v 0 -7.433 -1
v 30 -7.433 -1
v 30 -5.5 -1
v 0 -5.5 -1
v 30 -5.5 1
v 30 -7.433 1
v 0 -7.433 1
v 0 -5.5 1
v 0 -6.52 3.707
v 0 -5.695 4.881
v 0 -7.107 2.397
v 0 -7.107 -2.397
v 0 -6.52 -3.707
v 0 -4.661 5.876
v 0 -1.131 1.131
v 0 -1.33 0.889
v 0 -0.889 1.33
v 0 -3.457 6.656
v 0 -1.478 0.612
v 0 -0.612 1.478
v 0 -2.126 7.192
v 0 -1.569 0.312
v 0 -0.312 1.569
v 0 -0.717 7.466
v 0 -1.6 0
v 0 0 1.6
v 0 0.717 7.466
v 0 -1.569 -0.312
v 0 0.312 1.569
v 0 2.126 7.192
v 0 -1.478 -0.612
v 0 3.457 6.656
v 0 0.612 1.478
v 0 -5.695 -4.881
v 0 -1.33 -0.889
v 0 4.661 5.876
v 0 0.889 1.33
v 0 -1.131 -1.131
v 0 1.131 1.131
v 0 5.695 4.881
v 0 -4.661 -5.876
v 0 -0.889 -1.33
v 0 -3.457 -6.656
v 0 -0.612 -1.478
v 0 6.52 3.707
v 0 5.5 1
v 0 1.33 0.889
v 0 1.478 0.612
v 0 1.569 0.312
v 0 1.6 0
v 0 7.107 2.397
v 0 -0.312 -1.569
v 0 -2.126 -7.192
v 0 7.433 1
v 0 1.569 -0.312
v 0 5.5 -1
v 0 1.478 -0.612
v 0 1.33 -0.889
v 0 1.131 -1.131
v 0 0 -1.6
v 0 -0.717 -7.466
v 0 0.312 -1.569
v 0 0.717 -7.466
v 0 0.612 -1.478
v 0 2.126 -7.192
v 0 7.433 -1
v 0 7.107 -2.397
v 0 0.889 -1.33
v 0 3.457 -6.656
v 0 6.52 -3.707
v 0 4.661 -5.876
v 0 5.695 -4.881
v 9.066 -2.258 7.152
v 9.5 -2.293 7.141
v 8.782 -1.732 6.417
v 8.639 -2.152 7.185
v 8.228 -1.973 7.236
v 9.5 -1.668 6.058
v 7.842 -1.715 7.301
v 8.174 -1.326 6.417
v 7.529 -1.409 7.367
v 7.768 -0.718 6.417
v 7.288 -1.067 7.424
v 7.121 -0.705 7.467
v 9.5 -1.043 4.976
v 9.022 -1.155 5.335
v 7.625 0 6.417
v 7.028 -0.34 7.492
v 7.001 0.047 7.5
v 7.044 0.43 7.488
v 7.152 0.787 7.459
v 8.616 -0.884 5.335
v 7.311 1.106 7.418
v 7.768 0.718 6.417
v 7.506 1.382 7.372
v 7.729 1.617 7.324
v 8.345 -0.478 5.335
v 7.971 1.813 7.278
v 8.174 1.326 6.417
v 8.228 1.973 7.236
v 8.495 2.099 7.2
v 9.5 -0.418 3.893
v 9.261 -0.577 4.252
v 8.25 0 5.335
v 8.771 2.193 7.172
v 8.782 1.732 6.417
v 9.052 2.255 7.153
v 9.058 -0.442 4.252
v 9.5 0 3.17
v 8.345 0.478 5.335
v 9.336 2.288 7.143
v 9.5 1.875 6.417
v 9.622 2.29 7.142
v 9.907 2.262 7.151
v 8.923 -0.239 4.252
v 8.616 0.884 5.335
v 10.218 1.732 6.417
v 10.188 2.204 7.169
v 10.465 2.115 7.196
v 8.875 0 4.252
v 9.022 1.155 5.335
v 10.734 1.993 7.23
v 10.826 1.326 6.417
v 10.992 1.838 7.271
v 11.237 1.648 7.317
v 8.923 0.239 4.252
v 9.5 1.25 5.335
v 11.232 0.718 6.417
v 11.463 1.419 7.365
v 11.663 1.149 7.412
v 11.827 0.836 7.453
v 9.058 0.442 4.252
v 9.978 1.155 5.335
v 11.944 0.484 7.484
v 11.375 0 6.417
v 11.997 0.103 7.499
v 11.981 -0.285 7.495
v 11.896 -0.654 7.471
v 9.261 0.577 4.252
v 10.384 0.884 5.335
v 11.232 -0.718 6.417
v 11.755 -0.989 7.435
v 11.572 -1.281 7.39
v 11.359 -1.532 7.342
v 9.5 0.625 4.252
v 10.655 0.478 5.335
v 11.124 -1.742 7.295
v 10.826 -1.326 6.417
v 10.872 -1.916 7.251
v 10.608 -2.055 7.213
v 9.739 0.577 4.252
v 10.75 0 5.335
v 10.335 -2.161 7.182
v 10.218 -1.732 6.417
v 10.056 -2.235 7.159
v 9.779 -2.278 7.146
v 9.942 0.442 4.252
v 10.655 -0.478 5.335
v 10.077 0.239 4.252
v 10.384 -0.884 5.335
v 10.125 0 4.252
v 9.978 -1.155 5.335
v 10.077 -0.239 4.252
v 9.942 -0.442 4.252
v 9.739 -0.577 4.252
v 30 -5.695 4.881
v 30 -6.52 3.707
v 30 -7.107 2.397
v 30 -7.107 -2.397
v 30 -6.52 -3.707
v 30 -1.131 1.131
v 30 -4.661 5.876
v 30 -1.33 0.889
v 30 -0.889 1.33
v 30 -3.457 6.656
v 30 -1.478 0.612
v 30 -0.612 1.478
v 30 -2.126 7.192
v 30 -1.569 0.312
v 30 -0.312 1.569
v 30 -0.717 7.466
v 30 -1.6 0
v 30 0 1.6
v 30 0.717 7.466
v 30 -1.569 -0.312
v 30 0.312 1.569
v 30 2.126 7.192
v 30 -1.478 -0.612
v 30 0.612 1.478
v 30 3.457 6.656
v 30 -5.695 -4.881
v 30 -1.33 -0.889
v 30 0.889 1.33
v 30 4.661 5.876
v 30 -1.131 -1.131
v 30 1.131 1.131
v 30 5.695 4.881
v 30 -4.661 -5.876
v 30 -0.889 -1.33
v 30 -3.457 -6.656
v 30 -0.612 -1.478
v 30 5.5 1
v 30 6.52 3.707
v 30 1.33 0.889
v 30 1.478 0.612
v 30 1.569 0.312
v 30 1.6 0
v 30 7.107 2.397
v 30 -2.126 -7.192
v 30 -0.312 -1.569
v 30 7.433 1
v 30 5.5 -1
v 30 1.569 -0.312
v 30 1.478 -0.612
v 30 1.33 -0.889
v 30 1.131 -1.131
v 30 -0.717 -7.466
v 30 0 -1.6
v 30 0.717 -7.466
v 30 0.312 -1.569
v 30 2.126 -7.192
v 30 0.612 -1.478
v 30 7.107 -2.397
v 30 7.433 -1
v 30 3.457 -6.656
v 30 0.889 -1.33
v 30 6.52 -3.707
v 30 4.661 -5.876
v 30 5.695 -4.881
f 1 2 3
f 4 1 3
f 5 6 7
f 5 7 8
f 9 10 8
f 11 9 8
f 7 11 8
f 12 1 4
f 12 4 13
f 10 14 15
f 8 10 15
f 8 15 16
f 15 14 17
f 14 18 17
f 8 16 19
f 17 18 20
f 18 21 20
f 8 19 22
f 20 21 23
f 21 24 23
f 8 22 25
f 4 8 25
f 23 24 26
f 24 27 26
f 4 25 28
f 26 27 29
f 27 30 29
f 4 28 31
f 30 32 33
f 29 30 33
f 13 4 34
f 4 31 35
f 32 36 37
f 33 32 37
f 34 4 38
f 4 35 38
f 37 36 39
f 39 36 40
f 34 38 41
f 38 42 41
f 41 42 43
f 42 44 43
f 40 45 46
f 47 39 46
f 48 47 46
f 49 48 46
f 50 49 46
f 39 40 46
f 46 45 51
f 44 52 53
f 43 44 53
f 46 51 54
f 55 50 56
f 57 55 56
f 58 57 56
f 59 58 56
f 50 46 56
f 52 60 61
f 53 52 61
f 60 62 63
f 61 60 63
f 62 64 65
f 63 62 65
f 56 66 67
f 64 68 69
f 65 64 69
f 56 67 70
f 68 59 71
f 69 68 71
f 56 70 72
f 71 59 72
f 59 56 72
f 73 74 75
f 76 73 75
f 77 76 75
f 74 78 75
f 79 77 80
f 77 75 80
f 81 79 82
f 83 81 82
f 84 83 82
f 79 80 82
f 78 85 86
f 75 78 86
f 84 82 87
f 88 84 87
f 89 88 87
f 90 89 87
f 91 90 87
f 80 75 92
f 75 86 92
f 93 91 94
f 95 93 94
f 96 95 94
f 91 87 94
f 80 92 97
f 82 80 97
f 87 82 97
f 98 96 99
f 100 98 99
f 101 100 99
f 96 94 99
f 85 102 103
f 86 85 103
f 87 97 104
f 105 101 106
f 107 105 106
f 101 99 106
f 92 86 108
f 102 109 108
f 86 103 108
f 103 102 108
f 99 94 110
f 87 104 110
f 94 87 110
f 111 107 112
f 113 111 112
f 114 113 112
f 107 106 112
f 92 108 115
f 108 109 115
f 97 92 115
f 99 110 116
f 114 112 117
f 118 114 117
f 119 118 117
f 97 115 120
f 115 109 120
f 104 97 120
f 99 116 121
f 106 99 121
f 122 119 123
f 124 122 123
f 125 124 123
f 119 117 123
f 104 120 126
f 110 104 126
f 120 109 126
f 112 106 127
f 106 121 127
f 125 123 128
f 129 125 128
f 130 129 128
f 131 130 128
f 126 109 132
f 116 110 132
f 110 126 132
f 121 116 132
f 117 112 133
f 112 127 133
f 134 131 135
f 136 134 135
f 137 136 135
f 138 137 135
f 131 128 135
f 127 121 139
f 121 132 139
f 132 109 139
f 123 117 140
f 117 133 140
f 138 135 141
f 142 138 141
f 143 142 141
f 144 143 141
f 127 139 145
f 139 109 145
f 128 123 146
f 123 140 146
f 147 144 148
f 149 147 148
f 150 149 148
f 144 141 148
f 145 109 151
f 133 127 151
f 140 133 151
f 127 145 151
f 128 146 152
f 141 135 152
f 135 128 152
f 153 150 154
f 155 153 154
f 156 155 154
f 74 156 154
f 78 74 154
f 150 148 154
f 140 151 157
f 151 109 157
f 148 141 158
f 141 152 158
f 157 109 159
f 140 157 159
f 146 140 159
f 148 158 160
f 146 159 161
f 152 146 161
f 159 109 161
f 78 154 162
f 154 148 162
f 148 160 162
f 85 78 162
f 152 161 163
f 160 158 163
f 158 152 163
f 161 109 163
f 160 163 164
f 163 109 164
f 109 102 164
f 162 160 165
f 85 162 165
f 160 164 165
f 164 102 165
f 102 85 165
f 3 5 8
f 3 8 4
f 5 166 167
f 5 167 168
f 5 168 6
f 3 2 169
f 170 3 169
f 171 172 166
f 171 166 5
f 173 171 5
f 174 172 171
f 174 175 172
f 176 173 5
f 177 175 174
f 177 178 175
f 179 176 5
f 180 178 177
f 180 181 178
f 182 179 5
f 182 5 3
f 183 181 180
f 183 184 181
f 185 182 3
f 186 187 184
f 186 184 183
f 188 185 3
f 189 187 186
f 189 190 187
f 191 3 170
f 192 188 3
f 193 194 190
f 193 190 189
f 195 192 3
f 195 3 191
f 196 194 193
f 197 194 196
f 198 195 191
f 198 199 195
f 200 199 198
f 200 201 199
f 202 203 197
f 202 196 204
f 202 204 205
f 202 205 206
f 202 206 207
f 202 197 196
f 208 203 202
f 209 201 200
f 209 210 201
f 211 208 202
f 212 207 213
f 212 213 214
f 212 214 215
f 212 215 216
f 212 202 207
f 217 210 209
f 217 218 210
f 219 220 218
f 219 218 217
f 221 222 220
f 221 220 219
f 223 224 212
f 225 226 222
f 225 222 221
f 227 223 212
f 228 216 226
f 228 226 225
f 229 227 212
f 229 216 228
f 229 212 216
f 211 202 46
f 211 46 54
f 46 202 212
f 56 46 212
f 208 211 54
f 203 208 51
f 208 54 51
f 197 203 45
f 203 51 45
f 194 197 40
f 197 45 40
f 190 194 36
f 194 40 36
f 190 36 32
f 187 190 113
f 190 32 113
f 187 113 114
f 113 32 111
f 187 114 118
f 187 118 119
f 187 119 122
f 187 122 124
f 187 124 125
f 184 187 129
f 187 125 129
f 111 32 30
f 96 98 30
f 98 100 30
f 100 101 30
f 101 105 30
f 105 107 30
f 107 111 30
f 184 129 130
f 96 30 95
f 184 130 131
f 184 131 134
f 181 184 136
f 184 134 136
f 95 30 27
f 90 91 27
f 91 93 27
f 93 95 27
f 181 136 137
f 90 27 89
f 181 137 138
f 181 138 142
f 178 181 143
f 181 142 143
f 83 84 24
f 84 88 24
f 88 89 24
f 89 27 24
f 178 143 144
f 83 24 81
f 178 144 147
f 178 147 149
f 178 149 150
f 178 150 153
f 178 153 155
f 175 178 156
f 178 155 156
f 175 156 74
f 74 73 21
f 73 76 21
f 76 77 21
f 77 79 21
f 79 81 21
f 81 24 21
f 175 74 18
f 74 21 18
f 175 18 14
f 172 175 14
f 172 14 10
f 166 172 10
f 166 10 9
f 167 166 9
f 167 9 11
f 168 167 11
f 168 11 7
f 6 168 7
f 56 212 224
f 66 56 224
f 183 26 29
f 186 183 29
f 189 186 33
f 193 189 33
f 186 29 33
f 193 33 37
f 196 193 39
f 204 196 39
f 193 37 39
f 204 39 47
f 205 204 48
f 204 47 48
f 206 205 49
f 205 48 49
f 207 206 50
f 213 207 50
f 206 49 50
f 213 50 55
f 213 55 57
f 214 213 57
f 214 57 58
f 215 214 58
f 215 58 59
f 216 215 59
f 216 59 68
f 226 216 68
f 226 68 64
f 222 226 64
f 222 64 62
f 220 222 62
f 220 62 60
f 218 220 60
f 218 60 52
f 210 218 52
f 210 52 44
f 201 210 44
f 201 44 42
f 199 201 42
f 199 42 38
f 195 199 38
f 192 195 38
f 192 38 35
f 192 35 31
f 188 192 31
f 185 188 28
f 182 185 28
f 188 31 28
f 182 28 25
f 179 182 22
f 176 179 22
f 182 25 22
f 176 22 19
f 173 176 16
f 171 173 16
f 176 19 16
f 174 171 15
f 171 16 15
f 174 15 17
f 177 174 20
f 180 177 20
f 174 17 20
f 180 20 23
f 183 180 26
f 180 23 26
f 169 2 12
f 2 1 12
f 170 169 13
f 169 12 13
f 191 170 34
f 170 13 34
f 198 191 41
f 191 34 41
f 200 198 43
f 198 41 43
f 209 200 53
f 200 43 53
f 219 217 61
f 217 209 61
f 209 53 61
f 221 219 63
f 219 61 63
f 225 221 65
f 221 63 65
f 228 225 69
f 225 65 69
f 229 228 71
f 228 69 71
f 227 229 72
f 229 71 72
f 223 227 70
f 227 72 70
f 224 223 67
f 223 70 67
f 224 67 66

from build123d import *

# Parameters (mm, degrees)
ESQUISSE1_R             = 7.5
BOSS_EXTRU_1_DEPTH      = 30
ESQUISSE4_R             = 1.6
ENL_V_MAT_EXTRU_2_DEPTH = 32.819805295
ESQUISSE5_W             = 2
ESQUISSE5_H             = 2.6861835
ENL_V_MAT_EXTRU_3_DEPTH = 32.819805295


with BuildPart() as part:
    # Esquisse1 → Boss.-Extru.1 (new body)
    with BuildSketch(Plane(origin=(0, 0, 0), x_dir=(0, 0, -1), z_dir=(1, 0, 0))):
        Circle(ESQUISSE1_R)
    extrude(amount=BOSS_EXTRU_1_DEPTH)

    # Enlèv. mat.-Extru.1 cone 1 section (through the dimple's axis) → Enlèv. mat.-Extru.1 (revolve, cut)
    with BuildSketch(Plane(origin=(9.5, 0, 7.5), x_dir=(0, -1, 0), z_dir=(1, 0, 0))):
        Polygon((0, 0), (2.5, 0), (0, 4.330127019), align=None)
    revolve(axis=Axis((9.5, 0, 7.5), (0, 0, -1)), mode=Mode.SUBTRACT)

    # Esquisse4 → Enlèv. mat.-Extru.2 (cut, through all)
    with BuildSketch(Plane.ZY):
        Circle(ESQUISSE4_R)
    extrude(amount=-ENL_V_MAT_EXTRU_2_DEPTH, mode=Mode.SUBTRACT)

    # Esquisse5 → Enlèv. mat.-Extru.3 (cut, through all)
    with BuildSketch(Plane(origin=(30, 0, 0), x_dir=(0, 0, -1), z_dir=(1, 0, 0))):
        with Locations((0, 6.84309175)):
            Rectangle(ESQUISSE5_W, ESQUISSE5_H)
        with Locations((0, -6.84309175)):
            Rectangle(ESQUISSE5_W, ESQUISSE5_H)
    extrude(amount=-ENL_V_MAT_EXTRU_3_DEPTH, mode=Mode.SUBTRACT)


solid = part.part
